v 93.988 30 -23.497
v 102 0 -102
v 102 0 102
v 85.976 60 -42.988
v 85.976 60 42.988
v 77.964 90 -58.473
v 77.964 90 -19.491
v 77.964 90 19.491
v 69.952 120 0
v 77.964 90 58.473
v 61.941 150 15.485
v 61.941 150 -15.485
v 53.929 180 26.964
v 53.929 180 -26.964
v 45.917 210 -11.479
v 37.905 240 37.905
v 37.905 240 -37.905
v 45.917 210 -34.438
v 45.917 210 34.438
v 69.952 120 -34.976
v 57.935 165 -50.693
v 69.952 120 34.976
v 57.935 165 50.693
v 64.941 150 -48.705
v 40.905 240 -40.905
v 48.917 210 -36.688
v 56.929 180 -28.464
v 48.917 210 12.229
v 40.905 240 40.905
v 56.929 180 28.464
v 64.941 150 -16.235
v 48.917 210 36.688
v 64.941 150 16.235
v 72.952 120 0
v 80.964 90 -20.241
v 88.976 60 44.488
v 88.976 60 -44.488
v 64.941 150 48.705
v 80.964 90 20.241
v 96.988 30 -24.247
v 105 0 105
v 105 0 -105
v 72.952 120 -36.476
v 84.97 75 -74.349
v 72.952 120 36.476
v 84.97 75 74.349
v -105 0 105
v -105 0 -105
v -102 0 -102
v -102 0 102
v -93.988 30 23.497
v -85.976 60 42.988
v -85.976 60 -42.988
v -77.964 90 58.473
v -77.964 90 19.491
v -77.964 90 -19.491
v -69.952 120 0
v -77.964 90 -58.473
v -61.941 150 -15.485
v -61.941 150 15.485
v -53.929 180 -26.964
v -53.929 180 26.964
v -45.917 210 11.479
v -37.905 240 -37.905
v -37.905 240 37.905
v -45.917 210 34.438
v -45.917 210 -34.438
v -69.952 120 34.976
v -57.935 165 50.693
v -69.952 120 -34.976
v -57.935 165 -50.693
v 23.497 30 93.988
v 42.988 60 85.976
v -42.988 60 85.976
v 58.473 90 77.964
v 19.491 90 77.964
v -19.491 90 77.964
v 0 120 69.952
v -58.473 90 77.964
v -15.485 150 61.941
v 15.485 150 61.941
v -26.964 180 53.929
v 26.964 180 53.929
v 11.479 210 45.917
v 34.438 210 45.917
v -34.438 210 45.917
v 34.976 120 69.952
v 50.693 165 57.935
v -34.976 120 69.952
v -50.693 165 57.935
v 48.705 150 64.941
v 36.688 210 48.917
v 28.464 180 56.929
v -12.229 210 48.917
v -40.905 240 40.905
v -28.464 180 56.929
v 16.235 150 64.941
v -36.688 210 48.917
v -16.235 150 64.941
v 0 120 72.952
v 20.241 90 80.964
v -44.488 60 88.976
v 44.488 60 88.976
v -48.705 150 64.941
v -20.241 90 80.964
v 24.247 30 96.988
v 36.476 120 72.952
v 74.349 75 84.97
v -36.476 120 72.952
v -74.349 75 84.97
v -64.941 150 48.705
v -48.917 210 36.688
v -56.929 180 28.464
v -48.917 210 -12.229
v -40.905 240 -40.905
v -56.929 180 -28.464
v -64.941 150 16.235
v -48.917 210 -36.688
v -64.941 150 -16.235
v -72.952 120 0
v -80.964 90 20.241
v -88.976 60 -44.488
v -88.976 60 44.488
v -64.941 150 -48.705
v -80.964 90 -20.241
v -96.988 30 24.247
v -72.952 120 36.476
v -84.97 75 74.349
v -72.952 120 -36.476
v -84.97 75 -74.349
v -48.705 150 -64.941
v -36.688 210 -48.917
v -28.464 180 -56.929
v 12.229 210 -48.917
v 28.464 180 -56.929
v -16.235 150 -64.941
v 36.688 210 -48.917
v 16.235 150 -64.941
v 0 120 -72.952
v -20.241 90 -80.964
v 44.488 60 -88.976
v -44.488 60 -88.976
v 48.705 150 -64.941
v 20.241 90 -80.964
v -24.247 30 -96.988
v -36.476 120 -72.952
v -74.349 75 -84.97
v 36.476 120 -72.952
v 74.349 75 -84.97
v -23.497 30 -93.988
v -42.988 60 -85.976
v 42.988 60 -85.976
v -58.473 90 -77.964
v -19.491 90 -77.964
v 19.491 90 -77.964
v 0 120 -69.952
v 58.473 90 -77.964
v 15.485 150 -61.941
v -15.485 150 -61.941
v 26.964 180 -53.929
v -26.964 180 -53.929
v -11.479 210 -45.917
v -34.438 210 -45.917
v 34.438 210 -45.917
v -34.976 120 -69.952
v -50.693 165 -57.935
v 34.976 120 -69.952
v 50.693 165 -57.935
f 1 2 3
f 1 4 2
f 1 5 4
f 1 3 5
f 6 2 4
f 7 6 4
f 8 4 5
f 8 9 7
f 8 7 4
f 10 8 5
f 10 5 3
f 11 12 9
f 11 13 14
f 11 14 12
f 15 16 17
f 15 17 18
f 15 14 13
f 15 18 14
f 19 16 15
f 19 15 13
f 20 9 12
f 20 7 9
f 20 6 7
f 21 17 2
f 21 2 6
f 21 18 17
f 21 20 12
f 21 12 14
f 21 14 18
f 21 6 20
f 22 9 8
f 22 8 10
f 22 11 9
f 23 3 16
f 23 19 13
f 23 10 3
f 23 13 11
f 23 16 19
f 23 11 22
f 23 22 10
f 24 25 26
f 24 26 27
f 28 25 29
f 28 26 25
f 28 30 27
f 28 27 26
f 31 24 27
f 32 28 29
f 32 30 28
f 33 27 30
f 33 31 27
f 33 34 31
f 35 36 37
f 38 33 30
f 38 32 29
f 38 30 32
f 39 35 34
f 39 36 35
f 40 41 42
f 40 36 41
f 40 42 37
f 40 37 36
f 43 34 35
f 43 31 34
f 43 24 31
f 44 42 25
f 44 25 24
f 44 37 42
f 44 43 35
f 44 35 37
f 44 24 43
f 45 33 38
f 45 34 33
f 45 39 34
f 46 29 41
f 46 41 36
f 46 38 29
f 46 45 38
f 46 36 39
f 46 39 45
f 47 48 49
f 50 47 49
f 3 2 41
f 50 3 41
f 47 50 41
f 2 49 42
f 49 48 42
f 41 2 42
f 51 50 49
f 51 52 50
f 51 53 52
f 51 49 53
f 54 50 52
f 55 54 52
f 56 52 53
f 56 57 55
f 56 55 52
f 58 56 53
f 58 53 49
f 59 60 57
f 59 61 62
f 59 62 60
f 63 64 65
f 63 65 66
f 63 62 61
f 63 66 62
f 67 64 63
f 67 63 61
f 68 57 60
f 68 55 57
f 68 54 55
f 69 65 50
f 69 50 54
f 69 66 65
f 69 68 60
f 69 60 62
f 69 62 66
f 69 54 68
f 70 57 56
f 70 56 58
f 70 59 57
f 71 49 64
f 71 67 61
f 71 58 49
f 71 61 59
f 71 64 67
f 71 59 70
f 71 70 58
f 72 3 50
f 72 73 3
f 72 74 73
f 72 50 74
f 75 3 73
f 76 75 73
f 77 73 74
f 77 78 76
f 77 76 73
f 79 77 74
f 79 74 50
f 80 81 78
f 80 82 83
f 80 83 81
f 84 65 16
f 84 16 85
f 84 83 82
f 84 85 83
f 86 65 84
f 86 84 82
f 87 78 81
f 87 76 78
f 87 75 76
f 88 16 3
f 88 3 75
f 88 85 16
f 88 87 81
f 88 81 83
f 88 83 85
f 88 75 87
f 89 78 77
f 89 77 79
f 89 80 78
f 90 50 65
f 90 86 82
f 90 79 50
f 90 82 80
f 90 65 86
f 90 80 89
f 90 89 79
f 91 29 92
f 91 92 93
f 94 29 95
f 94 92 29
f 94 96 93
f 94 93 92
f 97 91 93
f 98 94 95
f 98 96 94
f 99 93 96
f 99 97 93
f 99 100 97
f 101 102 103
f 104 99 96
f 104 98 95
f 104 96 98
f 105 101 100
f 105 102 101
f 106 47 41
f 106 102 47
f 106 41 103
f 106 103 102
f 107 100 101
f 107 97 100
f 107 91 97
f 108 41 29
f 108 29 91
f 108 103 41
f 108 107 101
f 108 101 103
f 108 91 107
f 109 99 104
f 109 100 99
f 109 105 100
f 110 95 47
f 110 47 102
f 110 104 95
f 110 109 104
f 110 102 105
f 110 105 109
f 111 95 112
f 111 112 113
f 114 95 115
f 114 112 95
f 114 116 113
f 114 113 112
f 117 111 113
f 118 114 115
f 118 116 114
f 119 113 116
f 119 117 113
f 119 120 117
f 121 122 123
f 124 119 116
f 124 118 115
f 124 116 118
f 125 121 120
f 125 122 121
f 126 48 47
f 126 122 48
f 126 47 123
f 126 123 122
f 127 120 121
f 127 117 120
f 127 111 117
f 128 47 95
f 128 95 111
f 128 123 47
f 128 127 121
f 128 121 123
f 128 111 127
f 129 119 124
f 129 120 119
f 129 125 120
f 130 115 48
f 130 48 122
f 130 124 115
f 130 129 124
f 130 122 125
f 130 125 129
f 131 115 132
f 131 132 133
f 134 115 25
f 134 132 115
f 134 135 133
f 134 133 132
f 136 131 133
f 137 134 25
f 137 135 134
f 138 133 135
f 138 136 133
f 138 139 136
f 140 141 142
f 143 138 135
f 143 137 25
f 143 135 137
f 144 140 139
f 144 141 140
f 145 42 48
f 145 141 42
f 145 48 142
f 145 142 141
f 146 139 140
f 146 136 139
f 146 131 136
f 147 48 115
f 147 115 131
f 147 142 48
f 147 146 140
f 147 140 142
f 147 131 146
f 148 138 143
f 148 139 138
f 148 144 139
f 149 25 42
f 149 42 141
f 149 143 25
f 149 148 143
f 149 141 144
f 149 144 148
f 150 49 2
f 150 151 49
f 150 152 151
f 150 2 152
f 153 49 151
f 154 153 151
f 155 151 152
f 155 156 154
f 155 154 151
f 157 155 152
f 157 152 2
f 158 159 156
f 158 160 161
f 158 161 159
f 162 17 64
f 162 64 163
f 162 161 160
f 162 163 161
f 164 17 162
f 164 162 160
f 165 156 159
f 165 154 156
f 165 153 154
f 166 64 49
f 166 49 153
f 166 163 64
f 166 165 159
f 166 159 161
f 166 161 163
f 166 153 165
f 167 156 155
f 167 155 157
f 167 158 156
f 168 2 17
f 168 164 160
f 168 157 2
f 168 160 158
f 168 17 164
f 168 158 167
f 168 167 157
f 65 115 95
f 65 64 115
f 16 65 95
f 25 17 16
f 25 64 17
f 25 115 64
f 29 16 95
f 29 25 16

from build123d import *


with BuildPart() as part:
    # Sketch2 → Loft1 section 0
    with BuildSketch(Plane(origin=(0, 240, 0), x_dir=(1, 0, 0), z_dir=(0, 1, 0))):
        with BuildLine():
            Line((-40.905, 40.905), (40.905, 40.905))
            Line((40.905, 40.905), (40.905, -40.905))
            Line((40.905, -40.905), (-40.905, -40.905))
            Line((-40.905, -40.905), (-40.905, 40.905))
        make_face()
    # Sketch1 → Loft1 section 1
    with BuildSketch(Plane(origin=(0, 0, 0), x_dir=(1, 0, 0), z_dir=(0, 1, 0))):
        with BuildLine():
            Line((-105, 105), (105, 105))
            Line((105, 105), (105, -105))
            Line((105, -105), (-105, -105))
            Line((-105, -105), (-105, 105))
        make_face()
    loft()

    # Sketch5 → Cut-Loft1 section 0
    with BuildSketch(Plane.XZ):
        with BuildLine():
            Line((102, -102), (102, 102))
            Line((102, 102), (-102, 102))
            Line((-102, 102), (-102, -102))
            Line((-102, -102), (102, -102))
        make_face()
    # Sketch4 → Cut-Loft1 section 1
    with BuildSketch(Plane(origin=(0, 240, 0), x_dir=(1, 0, 0), z_dir=(0, 1, 0))):
        with BuildLine():
            Line((37.905, -37.905), (37.905, 37.905))
            Line((37.905, 37.905), (-37.905, 37.905))
            Line((-37.905, 37.905), (-37.905, -37.905))
            Line((-37.905, -37.905), (37.905, -37.905))
        make_face()
    loft(mode=Mode.SUBTRACT)


solid = part.part
